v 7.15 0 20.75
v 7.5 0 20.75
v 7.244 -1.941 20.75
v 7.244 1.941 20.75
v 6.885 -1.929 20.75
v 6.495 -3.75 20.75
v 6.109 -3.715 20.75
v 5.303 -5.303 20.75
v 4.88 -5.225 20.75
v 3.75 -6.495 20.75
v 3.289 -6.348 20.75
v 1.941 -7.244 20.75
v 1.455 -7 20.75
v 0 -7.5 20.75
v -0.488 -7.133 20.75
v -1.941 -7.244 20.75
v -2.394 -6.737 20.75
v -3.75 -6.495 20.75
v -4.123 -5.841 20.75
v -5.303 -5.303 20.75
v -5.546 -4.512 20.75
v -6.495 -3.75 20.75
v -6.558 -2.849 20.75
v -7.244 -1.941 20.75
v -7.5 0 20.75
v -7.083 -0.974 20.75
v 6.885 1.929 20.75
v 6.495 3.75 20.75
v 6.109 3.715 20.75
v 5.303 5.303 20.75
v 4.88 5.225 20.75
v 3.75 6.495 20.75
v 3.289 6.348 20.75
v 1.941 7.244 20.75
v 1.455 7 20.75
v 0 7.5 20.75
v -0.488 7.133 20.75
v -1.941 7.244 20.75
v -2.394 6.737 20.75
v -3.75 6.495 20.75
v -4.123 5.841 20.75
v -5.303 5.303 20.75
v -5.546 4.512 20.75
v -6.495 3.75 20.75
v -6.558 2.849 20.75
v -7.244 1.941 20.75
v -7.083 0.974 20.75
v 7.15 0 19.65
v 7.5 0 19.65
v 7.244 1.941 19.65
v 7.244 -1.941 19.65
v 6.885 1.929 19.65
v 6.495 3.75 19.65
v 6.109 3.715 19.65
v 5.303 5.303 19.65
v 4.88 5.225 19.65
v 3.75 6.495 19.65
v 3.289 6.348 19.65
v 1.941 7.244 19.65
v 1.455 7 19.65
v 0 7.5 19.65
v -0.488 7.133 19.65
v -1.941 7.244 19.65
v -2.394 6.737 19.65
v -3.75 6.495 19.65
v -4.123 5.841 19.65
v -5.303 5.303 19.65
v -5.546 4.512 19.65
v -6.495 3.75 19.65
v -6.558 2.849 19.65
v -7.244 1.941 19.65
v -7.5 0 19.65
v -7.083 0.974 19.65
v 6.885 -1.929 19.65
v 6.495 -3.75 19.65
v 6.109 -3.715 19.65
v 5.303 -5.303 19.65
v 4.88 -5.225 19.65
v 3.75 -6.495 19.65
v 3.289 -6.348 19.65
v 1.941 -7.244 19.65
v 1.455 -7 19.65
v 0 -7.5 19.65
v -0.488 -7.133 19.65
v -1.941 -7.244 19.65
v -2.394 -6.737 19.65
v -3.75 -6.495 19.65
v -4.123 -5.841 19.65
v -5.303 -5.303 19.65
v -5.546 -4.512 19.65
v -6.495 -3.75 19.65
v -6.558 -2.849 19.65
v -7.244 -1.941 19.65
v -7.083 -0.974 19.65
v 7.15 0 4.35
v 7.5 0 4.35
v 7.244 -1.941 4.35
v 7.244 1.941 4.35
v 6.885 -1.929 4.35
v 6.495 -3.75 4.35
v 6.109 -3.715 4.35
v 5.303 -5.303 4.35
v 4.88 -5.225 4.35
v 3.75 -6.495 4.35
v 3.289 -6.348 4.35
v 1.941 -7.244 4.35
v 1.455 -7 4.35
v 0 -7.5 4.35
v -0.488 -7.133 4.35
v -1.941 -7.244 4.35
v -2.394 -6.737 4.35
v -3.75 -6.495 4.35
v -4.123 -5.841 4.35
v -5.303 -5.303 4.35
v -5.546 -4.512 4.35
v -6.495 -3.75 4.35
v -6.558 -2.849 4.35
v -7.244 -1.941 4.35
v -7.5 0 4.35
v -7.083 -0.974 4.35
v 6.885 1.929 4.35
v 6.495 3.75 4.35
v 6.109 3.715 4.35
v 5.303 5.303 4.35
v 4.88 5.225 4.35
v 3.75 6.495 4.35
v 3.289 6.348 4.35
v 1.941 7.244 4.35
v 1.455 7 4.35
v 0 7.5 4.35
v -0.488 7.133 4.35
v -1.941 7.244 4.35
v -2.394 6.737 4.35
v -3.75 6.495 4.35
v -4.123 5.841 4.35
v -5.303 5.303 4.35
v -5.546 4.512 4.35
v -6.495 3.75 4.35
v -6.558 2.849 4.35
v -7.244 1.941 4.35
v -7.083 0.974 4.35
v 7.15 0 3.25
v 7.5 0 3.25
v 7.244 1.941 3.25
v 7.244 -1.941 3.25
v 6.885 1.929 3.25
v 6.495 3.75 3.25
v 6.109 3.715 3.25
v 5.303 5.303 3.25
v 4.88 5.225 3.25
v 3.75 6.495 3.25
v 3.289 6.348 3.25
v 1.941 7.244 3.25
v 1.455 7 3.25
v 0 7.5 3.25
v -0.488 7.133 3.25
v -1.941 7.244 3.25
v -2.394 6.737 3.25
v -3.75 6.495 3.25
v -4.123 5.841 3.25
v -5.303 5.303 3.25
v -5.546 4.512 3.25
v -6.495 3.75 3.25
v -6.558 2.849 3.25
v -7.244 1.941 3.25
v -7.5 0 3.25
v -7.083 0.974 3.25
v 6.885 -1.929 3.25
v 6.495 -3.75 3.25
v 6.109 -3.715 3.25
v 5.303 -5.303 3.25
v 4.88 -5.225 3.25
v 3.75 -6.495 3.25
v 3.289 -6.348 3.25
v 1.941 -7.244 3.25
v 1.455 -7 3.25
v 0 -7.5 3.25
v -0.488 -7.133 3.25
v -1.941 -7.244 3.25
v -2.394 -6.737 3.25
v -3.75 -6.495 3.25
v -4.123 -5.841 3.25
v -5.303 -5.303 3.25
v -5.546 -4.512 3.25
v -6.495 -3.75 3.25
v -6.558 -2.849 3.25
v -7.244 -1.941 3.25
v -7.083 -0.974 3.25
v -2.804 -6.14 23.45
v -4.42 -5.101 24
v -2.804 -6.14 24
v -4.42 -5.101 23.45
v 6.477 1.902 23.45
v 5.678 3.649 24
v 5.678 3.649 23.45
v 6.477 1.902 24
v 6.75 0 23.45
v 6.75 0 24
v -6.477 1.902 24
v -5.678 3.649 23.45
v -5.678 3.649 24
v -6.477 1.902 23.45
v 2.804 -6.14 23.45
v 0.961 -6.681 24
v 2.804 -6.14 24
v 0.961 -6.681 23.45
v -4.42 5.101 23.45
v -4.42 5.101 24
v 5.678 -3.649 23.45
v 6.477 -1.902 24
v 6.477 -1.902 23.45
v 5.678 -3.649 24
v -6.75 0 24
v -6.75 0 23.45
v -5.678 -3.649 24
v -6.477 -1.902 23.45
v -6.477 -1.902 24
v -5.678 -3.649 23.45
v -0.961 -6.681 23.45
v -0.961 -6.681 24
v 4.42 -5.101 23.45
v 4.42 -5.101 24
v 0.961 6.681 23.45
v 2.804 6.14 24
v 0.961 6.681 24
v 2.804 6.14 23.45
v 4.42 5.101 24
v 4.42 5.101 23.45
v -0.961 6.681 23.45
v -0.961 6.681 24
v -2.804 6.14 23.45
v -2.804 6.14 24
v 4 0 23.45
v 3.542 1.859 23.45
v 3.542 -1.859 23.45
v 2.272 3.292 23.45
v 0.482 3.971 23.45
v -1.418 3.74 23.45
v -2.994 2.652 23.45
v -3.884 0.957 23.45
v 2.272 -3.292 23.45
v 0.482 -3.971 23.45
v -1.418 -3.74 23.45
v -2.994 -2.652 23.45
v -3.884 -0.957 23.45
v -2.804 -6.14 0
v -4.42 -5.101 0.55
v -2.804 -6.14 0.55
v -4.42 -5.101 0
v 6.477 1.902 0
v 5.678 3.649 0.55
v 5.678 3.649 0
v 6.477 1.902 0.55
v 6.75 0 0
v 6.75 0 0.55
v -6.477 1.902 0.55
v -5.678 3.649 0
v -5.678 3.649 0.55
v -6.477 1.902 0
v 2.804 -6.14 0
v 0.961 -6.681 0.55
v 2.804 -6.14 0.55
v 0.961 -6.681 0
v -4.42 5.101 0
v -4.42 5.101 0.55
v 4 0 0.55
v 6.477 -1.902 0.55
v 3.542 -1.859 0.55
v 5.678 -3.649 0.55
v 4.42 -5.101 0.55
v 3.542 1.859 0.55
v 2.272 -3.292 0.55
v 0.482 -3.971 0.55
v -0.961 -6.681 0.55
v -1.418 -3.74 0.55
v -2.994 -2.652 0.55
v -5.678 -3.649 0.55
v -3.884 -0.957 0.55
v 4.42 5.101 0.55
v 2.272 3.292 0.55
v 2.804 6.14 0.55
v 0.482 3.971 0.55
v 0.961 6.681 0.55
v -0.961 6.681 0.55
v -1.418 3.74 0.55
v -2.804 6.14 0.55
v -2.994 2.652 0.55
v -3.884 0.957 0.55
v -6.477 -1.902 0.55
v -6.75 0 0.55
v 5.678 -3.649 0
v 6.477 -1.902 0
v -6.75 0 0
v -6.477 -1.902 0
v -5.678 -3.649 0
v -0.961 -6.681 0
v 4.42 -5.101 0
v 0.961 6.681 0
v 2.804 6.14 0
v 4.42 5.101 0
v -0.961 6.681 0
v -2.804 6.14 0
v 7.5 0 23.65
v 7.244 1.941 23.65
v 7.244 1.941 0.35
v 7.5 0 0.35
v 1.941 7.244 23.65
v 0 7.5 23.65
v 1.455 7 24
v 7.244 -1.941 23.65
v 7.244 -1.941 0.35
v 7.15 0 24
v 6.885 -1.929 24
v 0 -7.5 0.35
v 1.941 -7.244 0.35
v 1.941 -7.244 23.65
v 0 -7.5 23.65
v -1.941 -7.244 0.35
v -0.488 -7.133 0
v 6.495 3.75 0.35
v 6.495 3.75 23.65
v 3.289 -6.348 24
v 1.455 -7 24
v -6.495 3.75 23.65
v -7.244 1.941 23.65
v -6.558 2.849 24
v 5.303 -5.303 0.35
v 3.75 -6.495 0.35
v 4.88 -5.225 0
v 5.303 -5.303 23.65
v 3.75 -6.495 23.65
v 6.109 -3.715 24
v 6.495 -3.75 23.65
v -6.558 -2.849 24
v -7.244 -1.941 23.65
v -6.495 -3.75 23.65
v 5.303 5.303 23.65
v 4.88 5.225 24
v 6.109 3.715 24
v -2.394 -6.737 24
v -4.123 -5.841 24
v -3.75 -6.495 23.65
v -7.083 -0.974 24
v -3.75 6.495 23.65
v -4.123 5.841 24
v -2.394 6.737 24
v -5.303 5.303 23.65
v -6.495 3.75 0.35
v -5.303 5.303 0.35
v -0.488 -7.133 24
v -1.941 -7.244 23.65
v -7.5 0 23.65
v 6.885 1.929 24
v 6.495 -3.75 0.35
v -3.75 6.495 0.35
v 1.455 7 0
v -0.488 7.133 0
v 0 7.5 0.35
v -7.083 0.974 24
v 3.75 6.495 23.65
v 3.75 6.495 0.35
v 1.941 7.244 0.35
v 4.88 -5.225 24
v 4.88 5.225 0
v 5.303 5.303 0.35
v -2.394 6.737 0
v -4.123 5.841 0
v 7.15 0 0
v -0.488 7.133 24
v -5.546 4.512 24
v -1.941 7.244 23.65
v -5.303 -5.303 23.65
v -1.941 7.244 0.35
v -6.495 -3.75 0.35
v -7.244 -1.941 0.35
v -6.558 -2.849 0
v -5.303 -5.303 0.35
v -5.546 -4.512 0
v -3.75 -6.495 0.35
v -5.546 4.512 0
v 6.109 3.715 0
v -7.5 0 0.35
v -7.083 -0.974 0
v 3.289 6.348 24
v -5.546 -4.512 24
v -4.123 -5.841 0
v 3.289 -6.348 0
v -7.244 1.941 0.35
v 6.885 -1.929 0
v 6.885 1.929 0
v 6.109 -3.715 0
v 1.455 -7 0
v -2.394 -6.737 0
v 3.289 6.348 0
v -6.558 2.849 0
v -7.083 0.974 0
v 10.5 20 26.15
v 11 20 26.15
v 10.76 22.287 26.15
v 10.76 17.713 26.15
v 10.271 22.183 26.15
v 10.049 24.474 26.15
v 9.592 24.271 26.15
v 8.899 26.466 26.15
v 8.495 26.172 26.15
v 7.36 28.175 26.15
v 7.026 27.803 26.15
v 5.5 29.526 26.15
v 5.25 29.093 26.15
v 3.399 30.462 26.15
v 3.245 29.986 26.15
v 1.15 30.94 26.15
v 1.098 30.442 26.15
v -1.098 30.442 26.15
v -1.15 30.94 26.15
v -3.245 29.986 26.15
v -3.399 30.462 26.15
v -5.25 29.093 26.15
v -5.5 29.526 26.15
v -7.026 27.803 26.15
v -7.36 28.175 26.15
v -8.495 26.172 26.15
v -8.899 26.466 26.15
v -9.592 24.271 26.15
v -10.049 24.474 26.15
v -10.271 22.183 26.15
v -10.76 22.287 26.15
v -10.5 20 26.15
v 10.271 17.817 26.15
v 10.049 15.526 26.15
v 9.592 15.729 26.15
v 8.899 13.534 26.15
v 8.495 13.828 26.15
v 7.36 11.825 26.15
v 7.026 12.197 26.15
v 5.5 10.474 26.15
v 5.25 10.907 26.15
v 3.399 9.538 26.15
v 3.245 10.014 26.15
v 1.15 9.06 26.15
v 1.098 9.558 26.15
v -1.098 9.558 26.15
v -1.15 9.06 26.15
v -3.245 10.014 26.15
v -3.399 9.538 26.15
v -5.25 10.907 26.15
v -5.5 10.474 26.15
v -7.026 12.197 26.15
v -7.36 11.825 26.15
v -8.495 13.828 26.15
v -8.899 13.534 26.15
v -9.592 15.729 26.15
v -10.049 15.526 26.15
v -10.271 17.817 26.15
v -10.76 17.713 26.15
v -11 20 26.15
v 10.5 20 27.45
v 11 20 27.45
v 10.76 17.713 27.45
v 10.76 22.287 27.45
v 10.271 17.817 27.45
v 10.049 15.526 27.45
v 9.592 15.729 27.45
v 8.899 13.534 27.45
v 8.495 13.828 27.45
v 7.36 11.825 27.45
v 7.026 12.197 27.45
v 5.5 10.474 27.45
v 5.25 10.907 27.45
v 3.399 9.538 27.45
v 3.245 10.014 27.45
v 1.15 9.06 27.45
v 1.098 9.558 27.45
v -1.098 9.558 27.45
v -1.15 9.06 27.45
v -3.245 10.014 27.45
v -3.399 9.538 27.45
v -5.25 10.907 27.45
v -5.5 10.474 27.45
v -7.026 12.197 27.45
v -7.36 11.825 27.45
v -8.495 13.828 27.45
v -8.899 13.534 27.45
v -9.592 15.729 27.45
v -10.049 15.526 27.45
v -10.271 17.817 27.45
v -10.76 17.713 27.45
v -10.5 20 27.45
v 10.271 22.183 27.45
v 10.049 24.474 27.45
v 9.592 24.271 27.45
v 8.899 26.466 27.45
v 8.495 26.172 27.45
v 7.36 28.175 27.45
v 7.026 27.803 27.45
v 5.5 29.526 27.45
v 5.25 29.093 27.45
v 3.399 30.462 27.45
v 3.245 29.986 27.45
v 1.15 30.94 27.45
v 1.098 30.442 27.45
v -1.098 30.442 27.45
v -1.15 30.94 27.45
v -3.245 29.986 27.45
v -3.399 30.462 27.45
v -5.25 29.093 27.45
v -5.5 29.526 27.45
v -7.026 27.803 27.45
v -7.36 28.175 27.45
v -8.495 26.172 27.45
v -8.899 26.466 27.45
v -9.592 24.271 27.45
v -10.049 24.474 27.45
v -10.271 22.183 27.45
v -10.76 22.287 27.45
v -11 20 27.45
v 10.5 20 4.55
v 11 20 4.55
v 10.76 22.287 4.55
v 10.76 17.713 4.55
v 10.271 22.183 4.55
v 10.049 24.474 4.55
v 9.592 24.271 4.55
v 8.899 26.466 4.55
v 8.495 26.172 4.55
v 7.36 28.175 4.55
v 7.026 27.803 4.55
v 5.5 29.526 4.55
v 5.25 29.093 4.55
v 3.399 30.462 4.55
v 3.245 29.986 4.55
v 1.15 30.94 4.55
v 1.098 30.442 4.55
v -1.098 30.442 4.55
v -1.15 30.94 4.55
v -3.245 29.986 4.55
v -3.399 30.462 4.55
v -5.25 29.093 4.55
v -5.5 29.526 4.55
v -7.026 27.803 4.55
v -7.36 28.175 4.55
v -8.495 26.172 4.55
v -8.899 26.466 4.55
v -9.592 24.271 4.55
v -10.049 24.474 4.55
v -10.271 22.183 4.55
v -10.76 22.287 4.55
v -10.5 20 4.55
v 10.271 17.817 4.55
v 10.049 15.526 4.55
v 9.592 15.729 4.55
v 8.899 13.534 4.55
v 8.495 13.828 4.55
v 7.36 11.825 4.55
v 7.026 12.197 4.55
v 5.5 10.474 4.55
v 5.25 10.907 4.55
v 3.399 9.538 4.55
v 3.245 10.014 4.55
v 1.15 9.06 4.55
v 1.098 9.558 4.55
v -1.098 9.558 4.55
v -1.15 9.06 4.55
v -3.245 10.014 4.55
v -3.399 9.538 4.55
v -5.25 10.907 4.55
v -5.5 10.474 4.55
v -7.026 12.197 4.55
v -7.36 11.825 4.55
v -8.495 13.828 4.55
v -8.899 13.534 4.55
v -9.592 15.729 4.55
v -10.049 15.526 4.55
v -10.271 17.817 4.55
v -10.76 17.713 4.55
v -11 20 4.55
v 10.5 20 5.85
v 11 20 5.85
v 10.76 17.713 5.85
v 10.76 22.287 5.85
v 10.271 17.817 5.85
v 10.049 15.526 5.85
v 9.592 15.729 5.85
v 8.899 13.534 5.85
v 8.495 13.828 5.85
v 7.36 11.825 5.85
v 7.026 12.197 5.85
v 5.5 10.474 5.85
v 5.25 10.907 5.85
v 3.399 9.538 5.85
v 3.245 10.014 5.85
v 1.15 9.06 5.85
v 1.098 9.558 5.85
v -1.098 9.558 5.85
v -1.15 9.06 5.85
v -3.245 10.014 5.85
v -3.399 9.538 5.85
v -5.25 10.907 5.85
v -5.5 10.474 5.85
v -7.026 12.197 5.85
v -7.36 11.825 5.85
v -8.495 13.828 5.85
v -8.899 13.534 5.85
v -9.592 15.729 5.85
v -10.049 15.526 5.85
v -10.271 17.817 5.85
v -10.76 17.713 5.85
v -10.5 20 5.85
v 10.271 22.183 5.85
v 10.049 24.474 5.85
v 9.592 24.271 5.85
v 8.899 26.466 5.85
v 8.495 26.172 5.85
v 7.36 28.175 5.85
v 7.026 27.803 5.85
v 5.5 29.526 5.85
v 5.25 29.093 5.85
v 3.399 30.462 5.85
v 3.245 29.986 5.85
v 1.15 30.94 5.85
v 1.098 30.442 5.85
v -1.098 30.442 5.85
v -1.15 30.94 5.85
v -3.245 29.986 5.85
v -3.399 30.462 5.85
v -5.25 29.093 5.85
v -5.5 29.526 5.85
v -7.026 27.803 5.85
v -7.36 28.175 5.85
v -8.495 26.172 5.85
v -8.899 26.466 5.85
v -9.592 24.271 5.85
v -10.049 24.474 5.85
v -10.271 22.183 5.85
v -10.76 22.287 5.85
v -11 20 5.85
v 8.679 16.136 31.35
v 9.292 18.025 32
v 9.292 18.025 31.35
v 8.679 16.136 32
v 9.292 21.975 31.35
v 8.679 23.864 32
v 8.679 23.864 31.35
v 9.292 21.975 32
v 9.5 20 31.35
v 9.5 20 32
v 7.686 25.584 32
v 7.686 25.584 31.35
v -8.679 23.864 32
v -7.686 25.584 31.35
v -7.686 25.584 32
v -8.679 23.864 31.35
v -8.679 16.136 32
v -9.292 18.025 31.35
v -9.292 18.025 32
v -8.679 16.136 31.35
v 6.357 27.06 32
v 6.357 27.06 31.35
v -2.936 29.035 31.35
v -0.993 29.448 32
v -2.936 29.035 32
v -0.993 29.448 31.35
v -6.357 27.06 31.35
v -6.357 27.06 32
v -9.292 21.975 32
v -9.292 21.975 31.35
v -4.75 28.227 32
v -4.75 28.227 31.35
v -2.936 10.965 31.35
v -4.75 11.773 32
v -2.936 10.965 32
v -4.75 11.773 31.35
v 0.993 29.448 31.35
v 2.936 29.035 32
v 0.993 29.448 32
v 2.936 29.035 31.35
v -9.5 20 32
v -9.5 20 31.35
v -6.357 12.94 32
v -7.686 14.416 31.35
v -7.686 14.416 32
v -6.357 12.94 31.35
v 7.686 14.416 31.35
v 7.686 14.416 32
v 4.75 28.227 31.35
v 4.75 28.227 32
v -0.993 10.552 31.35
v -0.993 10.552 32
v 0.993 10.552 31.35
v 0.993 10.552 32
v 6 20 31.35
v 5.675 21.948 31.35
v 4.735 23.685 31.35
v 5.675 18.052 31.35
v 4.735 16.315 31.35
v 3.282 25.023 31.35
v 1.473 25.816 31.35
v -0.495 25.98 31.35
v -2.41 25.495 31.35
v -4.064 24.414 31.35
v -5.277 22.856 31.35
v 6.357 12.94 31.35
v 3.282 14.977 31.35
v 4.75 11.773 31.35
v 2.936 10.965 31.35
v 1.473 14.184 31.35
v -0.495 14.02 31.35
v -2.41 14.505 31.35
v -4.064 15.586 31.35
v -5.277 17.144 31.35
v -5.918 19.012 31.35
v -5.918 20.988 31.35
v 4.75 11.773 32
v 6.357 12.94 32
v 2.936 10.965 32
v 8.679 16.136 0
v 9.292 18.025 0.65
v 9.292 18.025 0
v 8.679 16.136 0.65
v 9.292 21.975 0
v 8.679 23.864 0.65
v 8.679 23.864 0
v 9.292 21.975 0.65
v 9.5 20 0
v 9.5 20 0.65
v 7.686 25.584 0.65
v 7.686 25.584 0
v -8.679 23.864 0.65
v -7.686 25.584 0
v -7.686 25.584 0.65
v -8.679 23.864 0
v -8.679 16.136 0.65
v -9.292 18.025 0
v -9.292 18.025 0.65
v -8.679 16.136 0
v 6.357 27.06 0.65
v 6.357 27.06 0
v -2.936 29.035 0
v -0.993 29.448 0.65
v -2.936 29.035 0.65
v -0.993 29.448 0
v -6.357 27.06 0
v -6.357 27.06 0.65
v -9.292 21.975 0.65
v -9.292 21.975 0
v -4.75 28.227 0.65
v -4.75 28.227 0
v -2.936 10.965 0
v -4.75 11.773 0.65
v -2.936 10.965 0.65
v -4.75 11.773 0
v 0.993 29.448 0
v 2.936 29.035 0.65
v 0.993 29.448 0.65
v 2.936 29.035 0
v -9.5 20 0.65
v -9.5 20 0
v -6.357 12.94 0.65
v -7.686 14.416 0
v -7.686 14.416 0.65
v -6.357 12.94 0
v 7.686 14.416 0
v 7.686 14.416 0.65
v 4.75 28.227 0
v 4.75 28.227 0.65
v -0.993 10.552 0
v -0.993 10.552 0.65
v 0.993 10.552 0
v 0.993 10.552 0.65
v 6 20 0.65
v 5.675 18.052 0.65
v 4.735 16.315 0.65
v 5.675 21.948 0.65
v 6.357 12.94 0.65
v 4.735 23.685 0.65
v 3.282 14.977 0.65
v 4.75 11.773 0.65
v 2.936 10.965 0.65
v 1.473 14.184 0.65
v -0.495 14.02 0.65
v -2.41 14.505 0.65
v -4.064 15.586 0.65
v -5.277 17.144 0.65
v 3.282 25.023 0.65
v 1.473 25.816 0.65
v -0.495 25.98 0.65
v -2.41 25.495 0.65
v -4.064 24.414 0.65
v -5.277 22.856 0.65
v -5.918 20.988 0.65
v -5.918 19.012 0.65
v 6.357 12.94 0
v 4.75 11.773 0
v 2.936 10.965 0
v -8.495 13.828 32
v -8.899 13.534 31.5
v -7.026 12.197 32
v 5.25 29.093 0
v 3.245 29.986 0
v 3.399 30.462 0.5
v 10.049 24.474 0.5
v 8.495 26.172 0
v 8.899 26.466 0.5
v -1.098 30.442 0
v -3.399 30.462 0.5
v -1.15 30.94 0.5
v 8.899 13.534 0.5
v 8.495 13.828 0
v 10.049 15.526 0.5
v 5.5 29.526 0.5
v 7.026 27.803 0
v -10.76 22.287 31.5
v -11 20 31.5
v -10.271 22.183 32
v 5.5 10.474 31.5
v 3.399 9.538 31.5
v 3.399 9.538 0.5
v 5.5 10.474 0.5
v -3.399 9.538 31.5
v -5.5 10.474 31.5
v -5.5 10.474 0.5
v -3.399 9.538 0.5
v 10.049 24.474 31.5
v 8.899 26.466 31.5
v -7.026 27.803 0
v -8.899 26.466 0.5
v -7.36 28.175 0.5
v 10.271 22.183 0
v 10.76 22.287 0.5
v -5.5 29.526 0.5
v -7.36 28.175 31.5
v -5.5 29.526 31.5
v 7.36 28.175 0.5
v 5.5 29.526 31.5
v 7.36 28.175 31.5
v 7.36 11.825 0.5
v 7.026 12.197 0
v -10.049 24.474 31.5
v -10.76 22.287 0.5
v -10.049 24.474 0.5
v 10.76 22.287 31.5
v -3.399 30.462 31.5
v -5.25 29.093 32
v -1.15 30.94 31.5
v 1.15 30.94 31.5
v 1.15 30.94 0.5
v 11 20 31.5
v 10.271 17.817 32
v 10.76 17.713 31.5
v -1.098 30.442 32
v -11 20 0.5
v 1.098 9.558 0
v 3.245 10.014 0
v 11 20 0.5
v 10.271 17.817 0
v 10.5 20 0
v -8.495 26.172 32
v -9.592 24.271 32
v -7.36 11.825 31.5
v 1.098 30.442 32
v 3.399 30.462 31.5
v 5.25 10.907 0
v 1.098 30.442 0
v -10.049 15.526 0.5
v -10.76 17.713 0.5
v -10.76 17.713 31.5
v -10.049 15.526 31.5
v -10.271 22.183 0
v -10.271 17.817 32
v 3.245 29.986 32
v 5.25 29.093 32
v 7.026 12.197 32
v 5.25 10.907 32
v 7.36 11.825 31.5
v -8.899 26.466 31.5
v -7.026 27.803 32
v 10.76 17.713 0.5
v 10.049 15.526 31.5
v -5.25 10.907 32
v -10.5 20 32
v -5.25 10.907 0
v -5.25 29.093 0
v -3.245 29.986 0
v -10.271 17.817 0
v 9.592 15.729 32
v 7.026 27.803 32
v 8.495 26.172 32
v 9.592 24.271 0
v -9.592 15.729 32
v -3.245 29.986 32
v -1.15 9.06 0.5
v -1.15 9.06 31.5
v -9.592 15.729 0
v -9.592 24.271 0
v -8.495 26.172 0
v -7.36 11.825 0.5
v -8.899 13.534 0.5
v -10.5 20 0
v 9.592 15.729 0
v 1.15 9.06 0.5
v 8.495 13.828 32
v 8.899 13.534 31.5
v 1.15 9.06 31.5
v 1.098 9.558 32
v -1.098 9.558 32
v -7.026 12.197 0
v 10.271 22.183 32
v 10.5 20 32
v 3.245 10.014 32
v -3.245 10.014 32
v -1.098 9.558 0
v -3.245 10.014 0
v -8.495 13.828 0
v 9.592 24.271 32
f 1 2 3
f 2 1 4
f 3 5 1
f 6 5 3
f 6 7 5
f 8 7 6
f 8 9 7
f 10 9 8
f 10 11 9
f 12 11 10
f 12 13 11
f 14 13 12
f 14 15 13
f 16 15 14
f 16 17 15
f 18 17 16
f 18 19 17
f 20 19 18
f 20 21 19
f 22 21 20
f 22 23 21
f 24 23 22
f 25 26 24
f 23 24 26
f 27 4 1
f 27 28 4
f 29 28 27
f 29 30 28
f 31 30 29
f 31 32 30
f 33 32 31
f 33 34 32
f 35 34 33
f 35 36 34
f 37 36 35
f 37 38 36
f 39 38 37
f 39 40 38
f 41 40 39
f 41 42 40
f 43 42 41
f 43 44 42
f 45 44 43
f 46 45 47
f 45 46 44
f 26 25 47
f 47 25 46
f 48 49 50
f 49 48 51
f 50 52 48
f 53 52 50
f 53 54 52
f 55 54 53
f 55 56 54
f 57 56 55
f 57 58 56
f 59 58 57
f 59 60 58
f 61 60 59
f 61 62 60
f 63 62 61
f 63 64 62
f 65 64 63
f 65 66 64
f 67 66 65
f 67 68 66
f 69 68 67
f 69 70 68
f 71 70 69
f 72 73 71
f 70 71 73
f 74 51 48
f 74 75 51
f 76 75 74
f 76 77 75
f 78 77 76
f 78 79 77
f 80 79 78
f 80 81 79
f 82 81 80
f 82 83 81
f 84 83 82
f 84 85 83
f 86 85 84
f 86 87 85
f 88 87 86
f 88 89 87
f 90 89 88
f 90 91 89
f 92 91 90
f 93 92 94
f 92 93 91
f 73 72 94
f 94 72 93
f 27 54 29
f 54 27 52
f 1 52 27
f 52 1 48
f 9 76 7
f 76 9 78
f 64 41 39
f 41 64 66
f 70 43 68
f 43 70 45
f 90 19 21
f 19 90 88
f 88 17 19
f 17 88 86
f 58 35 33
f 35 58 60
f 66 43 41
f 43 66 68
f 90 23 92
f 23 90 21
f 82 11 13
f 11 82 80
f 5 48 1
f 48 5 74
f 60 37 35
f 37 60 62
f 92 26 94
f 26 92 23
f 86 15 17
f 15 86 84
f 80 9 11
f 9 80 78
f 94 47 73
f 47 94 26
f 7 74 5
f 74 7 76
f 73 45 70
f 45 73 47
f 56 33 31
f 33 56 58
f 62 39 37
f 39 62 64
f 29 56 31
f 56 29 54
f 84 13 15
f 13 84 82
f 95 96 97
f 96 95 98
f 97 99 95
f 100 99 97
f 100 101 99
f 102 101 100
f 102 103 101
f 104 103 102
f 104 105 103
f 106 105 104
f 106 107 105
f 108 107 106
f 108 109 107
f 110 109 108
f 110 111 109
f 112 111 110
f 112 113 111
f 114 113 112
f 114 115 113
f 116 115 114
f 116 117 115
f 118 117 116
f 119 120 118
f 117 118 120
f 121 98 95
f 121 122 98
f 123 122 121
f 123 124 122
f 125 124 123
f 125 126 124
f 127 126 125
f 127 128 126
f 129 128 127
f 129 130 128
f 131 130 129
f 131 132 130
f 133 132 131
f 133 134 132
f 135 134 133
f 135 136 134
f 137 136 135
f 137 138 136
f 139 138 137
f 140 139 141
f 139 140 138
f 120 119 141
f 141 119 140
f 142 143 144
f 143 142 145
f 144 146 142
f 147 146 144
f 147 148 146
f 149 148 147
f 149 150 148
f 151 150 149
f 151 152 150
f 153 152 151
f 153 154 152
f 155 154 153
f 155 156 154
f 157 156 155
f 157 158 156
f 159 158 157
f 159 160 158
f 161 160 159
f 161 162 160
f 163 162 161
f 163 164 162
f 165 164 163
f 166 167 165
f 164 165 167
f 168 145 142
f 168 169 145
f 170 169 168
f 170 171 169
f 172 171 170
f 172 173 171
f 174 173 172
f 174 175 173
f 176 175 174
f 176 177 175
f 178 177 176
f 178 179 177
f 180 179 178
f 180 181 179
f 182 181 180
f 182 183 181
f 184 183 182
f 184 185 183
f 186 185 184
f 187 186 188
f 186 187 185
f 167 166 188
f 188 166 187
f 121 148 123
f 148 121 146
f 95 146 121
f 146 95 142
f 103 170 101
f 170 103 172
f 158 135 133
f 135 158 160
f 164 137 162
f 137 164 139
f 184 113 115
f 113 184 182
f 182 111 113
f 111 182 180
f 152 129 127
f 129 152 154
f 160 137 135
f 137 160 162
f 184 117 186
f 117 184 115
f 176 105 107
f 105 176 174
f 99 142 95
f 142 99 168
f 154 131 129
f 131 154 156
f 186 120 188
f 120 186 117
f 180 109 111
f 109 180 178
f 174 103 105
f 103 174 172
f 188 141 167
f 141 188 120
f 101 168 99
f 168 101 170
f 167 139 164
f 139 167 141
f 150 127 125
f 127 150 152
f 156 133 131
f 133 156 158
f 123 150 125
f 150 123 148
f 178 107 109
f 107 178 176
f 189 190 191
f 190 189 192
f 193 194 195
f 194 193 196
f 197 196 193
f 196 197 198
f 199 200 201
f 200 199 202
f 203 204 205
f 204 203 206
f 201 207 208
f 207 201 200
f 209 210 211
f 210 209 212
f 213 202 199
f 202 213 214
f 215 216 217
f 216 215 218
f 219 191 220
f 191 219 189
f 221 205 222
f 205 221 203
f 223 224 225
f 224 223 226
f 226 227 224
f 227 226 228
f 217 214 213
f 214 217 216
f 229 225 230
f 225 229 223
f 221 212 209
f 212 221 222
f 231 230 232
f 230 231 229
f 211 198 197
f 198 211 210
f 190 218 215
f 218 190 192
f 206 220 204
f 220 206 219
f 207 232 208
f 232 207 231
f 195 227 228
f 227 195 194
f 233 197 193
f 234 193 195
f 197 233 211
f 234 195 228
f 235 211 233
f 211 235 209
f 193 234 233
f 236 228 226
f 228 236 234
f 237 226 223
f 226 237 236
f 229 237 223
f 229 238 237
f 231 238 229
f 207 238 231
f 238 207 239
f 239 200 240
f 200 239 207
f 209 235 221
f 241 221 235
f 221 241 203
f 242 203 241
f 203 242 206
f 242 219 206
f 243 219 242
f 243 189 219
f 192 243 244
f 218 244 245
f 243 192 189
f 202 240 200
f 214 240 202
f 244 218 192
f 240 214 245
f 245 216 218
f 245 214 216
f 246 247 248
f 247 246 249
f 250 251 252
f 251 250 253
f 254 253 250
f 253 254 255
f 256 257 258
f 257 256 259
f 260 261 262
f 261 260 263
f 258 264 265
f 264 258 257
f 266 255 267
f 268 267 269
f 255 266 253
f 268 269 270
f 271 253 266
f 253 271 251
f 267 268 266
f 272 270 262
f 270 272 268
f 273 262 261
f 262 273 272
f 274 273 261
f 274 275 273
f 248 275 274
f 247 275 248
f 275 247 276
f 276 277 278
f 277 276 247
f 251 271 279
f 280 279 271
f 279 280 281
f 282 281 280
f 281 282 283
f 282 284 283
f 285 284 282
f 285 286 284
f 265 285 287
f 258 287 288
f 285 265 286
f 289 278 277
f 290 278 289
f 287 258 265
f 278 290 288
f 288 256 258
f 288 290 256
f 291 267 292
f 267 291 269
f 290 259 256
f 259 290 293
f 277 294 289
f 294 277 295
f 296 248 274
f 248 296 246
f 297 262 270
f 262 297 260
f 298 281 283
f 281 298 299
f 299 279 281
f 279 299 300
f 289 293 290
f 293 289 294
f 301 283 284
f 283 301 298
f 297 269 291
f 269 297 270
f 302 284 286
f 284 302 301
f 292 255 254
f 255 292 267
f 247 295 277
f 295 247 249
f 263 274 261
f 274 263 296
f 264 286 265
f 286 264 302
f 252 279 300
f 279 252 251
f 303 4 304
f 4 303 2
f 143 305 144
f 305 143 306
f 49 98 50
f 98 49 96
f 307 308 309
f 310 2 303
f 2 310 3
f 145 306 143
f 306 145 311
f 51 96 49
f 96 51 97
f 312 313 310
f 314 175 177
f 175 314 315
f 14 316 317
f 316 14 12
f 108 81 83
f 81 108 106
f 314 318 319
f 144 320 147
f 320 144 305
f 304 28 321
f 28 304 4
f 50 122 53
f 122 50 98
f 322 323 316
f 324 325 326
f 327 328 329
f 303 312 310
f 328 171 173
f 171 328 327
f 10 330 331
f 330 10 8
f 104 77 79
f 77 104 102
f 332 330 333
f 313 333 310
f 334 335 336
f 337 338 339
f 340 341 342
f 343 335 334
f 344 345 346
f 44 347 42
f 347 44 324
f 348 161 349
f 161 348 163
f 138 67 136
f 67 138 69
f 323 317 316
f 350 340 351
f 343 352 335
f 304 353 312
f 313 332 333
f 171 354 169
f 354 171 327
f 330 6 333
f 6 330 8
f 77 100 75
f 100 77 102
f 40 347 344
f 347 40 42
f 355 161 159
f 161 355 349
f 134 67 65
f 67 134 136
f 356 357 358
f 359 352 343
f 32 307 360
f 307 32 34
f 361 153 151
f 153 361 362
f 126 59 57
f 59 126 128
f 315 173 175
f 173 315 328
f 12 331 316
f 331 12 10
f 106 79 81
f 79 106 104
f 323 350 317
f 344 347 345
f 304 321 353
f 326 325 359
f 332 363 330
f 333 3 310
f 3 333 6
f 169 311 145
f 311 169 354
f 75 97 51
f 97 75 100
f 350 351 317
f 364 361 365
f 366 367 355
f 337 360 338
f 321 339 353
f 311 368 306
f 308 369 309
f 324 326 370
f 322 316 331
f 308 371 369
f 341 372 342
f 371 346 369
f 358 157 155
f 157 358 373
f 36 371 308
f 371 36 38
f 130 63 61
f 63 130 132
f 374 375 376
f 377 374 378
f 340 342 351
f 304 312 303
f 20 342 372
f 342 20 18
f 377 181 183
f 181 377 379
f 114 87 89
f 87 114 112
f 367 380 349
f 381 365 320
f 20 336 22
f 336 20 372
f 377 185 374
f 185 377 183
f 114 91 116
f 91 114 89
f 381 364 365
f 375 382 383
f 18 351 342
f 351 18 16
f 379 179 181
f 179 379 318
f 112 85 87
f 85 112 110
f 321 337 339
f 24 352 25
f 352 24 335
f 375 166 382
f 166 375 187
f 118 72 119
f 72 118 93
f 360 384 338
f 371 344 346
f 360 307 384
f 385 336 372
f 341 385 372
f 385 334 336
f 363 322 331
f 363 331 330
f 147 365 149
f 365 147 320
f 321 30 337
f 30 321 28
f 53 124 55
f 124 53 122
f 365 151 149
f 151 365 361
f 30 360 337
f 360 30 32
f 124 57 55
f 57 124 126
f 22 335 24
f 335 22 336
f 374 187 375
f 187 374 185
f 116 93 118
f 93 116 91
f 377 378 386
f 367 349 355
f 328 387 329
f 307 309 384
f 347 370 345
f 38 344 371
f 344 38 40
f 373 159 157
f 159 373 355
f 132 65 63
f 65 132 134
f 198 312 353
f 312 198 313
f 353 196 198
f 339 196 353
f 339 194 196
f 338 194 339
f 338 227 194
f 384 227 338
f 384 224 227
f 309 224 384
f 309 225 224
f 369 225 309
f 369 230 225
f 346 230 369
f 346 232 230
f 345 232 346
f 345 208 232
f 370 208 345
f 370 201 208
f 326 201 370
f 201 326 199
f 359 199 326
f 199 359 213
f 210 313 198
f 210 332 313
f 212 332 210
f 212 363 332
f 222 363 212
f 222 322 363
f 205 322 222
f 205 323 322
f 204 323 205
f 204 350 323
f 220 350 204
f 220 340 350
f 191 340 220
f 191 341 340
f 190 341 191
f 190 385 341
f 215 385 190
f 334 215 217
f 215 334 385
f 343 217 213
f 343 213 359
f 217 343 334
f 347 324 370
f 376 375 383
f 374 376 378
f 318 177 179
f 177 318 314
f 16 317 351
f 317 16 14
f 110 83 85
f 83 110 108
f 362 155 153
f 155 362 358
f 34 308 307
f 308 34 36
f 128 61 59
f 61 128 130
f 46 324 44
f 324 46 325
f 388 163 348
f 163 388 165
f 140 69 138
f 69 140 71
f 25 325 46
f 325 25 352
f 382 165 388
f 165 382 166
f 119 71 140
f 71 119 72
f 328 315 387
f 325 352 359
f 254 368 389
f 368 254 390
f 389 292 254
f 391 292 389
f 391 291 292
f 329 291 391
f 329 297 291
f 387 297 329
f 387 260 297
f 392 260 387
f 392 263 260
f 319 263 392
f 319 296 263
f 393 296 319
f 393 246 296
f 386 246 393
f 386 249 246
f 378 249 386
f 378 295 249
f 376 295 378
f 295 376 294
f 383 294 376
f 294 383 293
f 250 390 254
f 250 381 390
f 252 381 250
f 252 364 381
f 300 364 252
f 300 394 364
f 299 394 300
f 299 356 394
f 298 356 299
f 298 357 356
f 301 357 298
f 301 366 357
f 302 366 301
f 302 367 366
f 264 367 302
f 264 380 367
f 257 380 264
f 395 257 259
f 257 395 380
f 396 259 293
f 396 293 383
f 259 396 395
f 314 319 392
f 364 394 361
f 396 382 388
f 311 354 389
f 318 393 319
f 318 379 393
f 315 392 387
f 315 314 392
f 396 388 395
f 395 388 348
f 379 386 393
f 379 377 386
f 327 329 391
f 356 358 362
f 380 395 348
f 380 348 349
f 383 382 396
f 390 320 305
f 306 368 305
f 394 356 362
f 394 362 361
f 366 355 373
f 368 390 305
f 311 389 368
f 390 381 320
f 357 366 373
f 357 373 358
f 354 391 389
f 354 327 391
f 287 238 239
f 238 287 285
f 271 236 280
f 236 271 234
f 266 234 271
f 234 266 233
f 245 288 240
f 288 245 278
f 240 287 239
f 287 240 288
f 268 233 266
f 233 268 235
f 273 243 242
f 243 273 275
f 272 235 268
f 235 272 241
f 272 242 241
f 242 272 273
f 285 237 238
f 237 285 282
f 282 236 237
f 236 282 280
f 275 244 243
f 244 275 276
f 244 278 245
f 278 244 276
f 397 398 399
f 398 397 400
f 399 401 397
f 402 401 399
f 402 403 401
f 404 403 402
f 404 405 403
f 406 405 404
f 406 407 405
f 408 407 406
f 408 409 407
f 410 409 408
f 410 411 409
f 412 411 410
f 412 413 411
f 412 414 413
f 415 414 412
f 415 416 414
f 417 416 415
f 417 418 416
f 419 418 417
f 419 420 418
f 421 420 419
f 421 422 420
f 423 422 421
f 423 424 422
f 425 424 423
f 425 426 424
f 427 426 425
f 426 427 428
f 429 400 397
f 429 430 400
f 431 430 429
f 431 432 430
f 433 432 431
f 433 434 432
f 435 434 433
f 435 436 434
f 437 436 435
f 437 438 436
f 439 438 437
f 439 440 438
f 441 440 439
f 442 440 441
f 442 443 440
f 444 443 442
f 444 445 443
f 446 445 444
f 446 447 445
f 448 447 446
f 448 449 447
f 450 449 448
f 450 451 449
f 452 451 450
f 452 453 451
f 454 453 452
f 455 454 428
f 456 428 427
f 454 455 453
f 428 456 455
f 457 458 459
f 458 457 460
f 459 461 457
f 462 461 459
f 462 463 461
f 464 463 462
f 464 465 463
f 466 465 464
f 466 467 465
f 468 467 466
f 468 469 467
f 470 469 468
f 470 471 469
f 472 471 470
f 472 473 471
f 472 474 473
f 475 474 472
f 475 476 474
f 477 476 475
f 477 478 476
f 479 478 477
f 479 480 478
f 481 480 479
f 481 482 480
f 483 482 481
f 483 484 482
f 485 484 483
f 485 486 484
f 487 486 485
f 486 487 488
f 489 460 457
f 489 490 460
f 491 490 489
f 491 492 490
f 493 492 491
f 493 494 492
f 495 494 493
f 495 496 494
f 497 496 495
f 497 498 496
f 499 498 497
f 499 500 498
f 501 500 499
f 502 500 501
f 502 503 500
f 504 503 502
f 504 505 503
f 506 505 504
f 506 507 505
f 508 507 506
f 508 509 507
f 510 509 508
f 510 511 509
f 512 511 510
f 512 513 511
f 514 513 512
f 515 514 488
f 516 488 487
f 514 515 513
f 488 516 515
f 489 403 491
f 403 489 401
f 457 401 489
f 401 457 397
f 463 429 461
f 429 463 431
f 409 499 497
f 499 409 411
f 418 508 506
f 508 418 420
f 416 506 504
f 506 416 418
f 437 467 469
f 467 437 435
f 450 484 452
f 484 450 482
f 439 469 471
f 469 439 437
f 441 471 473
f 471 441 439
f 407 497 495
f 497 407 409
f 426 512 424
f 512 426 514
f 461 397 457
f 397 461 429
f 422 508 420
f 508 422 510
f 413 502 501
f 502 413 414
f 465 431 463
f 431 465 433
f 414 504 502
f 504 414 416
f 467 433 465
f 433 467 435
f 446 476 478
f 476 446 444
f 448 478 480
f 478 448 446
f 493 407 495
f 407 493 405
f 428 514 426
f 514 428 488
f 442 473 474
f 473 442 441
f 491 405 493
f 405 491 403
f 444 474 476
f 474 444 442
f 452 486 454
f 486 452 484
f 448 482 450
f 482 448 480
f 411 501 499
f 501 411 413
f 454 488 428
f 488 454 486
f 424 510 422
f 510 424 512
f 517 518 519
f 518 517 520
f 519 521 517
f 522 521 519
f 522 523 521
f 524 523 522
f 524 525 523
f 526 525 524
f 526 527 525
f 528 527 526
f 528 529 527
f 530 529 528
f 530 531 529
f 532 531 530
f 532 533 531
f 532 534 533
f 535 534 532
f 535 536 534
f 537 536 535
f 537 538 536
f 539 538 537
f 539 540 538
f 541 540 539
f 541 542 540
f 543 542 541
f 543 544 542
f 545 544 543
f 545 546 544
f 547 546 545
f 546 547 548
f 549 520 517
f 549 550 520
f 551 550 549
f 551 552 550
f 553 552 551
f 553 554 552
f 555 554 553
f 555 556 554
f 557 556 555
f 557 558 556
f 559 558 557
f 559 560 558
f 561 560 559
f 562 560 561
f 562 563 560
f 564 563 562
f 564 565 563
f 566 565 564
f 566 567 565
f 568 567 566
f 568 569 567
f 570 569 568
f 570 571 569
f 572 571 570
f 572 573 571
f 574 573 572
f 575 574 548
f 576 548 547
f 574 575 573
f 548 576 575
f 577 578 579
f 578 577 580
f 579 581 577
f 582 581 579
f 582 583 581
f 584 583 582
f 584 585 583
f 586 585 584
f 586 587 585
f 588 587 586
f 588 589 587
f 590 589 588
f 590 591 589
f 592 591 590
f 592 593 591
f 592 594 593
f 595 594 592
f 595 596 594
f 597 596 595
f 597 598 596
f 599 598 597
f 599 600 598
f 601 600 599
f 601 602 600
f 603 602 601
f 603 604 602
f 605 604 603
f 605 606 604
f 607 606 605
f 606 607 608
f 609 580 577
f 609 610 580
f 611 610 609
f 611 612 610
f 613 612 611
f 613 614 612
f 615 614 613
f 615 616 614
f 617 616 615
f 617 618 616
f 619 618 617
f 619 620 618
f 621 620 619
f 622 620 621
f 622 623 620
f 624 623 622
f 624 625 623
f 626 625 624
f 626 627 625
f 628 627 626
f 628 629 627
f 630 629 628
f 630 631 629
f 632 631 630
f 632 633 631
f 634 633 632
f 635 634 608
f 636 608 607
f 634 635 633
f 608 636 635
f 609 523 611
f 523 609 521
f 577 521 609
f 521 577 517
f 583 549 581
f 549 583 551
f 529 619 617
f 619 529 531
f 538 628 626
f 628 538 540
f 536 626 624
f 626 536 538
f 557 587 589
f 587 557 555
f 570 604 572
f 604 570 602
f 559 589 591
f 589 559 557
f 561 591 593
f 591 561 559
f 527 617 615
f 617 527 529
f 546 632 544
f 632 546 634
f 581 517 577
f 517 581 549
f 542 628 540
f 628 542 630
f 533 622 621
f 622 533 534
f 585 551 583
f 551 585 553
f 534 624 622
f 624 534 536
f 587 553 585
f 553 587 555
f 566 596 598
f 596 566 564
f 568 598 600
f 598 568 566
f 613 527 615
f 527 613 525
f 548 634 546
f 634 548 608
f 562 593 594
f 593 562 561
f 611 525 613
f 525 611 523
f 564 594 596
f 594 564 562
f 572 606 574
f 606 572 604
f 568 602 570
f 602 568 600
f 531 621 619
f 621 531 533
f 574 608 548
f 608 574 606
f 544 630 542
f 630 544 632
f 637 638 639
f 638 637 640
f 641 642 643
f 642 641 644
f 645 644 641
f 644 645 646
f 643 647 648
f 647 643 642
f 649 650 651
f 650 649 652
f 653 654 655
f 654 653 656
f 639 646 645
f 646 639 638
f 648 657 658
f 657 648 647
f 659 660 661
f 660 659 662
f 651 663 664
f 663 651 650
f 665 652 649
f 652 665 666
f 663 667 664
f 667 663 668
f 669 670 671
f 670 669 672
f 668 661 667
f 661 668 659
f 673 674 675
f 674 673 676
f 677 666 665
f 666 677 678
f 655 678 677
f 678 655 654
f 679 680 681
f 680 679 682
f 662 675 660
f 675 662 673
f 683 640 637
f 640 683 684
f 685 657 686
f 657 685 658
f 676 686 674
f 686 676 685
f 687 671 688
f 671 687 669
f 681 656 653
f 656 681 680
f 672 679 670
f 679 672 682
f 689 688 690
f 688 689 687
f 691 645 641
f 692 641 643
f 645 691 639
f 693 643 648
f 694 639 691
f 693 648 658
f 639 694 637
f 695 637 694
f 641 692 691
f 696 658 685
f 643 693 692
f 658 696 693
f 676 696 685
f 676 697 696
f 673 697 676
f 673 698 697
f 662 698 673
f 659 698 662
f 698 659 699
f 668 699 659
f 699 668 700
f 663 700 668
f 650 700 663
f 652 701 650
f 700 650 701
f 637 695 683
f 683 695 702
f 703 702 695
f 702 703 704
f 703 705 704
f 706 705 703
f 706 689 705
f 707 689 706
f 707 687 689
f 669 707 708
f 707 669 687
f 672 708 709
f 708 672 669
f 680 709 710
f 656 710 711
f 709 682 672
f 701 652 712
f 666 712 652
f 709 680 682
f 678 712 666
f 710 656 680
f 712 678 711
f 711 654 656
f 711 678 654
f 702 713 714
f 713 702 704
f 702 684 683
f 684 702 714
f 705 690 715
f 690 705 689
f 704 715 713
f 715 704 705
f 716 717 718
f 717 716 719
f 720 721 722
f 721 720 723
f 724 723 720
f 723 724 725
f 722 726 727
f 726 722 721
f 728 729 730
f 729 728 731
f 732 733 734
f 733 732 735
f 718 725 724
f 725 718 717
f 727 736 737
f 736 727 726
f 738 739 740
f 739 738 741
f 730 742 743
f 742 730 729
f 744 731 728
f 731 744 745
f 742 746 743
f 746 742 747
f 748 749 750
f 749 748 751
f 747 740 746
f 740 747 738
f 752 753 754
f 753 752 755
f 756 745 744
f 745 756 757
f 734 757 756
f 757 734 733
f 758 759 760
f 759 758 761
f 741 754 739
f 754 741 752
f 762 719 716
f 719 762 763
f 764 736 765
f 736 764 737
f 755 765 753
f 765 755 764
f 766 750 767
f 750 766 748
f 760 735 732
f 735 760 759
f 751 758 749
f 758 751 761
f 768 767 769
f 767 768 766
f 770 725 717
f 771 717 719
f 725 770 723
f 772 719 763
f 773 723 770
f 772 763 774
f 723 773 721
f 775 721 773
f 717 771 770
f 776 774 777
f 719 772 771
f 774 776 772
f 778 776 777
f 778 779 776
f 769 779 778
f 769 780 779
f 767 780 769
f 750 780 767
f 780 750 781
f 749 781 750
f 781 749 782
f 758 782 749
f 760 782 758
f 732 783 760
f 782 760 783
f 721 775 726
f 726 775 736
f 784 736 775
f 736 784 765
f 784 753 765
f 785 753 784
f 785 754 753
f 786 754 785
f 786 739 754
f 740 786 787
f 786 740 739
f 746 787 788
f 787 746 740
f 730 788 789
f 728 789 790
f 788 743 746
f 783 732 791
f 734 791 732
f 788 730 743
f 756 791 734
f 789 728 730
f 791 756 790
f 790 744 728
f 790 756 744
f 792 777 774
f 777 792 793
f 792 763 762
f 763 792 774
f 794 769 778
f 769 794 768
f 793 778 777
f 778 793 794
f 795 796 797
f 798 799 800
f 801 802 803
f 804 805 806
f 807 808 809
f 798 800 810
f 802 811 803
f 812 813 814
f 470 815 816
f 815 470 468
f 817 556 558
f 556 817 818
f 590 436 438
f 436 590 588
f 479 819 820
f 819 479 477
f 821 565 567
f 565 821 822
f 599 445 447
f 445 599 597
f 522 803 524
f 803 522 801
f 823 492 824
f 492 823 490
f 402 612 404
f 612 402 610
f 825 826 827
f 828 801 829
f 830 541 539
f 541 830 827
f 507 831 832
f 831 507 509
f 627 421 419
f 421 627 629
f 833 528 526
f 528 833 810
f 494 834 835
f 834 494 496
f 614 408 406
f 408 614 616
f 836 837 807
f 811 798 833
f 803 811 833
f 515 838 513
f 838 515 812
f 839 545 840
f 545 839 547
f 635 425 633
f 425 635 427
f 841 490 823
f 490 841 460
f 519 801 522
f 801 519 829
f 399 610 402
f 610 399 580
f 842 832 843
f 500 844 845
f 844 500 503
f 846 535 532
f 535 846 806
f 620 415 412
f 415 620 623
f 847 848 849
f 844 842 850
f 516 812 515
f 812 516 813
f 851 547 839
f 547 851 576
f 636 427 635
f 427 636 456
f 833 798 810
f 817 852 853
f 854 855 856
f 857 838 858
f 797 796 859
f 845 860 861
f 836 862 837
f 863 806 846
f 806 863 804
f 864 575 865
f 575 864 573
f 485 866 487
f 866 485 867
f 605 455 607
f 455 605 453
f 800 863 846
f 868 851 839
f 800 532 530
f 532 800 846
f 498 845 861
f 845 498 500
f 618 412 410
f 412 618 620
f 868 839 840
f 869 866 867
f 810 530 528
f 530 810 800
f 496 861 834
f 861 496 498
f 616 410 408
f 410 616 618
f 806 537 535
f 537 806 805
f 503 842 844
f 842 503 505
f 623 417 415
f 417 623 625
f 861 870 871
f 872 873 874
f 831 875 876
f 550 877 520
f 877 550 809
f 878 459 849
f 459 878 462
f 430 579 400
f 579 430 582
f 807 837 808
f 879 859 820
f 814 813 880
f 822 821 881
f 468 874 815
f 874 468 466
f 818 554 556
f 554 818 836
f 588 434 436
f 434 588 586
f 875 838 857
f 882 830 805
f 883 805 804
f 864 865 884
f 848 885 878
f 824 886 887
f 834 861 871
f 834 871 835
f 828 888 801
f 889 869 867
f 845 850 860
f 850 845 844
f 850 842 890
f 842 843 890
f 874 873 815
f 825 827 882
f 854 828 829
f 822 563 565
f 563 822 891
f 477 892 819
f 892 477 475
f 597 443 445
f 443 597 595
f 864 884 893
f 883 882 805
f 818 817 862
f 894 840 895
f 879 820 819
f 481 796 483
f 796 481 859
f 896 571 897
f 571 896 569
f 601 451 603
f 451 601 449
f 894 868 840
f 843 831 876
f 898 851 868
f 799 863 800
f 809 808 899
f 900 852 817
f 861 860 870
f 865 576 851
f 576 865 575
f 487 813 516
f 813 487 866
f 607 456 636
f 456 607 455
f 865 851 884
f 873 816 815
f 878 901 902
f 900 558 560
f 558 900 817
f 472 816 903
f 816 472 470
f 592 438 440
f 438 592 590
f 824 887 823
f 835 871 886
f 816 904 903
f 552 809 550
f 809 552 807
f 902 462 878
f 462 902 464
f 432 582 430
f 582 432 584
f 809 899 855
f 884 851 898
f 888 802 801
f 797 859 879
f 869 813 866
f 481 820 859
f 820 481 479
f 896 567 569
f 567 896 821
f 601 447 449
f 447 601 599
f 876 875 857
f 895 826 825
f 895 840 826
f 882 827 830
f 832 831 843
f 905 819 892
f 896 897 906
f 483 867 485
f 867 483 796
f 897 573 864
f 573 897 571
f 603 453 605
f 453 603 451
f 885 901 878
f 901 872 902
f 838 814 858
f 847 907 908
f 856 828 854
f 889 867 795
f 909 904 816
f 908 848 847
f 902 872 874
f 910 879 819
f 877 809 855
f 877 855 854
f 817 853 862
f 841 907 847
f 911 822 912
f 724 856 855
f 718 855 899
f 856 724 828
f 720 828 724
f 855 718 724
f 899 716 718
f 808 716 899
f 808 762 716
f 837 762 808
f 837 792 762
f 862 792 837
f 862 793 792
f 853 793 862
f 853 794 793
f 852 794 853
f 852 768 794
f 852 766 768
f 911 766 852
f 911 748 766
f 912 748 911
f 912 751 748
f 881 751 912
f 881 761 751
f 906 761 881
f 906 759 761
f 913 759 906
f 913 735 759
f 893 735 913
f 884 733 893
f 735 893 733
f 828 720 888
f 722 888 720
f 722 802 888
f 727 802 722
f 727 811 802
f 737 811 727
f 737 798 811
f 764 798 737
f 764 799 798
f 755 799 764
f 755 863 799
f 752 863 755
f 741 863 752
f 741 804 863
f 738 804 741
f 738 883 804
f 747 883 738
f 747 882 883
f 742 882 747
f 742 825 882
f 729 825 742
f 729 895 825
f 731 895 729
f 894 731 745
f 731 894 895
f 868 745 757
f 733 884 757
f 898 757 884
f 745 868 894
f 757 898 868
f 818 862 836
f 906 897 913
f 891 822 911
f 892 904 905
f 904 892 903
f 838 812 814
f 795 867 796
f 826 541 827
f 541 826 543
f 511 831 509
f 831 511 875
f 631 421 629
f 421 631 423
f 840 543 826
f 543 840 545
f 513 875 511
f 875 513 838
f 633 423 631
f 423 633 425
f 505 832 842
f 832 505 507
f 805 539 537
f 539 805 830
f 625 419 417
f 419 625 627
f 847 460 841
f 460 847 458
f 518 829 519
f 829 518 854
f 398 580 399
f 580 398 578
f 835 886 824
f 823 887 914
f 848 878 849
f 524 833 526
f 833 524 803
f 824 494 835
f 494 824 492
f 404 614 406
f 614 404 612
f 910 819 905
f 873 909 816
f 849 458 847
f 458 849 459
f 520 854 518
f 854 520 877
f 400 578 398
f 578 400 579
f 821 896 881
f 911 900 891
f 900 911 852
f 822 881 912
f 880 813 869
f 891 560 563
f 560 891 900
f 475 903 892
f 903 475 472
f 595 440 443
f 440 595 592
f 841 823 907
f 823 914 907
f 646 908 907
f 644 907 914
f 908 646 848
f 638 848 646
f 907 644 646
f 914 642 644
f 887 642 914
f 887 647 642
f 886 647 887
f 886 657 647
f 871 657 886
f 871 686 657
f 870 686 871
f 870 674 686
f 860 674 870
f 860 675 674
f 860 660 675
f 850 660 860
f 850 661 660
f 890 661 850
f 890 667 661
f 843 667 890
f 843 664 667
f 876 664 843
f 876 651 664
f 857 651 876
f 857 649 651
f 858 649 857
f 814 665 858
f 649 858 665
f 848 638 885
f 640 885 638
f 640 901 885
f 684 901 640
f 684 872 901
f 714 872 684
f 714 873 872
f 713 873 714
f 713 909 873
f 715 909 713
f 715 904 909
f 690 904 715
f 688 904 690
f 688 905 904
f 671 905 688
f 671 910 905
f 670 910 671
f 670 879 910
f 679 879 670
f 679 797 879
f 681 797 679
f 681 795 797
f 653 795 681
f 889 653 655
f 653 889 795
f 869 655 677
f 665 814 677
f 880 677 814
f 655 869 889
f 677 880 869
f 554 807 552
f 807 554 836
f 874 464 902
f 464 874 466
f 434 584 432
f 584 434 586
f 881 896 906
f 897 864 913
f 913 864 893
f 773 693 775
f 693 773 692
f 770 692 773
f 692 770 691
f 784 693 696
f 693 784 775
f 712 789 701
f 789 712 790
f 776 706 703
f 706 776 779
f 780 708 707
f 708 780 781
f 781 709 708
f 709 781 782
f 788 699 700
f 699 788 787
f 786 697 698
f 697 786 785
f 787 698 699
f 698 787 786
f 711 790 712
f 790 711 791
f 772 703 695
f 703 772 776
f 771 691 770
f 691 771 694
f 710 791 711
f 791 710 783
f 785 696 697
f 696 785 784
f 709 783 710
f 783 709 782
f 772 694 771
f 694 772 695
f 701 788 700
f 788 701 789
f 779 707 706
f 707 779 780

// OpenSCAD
// Open SCAD model of linear Bearing LM-8-UU & KB-12-WW

//     LM-8-UU        KB-12-WW
//	D_Int =  8.0	D_Int = 12.0
//	D_Ext = 15.0	D_Ext = 22.0
//	D_1   = 14.3	D_1   = 21.0
//	L     = 24.0	L     = 32.0
//	W     =  1.1	W     =  1.3
//	B     = 17.5	B     = 22.9



module groove(d1, d2, w) {
	difference() {
		cylinder(r=d1/2+1, h=w, center=true);
		cylinder(r=d2/2  , h=w, center=true);
	}
}

module lb(D_Int=8, D_Ext=15, D_1=14.3, L=24, W=1.1, B=17.5) {
chamf = D_Ext - D_1;
	difference() {
		hull() {
			cylinder(r=D_Ext/2, h=L-chamf, center=true);
			cylinder(r=D_1  /2, h=L      , center=true);
		}
		cylinder(r=D_Int/2, h=L+2    , center=true);
		translate([0, 0, B/2-W/2]) groove(D_Ext, D_1, W);
		translate([0, 0,-B/2+W/2]) groove(D_Ext, D_1, W);
		translate([0, 0,     L/2]) groove(D_Ext-(D_Ext-D_Int)/2, 1, W);
		translate([0, 0,    -L/2]) groove(D_Ext-(D_Ext-D_Int)/2, 1, W);
	}
}


module linear_bearing(linear_bearing_type) {
	if(linear_bearing_type == "LM-8-UU") {   //LM-8-UU
		lb(D_Int=8, D_Ext=15, D_1=14.3, L=24, W=1.1, B=17.5);
	}
	else {
		if(linear_bearing_type == "KB-12-WW") {   //KB-12-WW
			lb(D_Int=12, D_Ext=22, D_1=21, L=32, W=1.3, B=22.9);
		}
	}
}


translate([0,  0, 12]) linear_bearing("LM-8-UU" );
translate([0, 20, 16]) linear_bearing("KB-12-WW");
